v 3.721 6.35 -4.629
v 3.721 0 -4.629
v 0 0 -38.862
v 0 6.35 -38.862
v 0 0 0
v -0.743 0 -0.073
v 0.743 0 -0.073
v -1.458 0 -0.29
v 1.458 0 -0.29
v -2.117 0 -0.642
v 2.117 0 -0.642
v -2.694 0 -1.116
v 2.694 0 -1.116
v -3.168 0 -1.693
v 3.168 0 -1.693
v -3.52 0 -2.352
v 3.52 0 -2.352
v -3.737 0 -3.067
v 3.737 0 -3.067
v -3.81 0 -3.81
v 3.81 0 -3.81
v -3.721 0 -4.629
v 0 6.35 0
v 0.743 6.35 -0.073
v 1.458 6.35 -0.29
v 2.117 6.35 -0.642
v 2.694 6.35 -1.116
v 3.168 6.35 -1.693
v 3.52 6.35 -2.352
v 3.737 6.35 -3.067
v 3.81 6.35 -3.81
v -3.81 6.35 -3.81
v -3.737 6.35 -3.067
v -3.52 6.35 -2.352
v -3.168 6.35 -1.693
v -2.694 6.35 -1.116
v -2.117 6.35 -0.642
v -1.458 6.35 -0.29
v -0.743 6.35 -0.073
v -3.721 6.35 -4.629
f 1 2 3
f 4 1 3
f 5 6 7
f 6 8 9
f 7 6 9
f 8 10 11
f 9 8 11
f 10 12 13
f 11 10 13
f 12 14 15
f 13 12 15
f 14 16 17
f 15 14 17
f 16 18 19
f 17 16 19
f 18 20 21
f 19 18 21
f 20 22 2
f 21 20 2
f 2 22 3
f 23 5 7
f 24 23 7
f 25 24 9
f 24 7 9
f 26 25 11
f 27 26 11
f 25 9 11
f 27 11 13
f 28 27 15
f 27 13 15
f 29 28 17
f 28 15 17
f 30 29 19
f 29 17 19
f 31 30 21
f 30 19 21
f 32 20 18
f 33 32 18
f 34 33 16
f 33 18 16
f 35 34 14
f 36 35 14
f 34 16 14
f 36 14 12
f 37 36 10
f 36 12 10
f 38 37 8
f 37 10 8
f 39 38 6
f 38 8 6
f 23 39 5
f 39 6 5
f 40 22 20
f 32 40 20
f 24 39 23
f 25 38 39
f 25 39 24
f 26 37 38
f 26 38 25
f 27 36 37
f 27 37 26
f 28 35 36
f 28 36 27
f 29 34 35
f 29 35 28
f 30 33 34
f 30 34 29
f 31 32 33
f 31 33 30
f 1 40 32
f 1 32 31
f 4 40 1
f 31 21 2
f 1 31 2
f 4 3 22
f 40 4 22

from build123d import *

# Parameters (mm, degrees)
BOSS_EXTRUDE1_DEPTH = 6.35


with BuildPart() as part:
    # Sketch1 → Boss-Extrude1 (new body)
    with BuildSketch(Plane(origin=(0, 0, 0), x_dir=(1, 0, 0), z_dir=(0, 1, 0))):
        with BuildLine():
            ThreePointArc((-3.81, 3.81), (-2.694076836, 1.115923164), (0, 0))
            Line((0, 0), (0, 7.62))
            ThreePointArc((0, 7.62), (-2.387181834, 6.779421306), (-3.721022887, 4.628589444))
            Line((-3.721022887, 4.628589444), (-3.81, 3.81))
        make_face()
        with BuildLine():
            ThreePointArc((-3.721022887, 4.628589444), (-2.387181834, 6.779421306), (0, 7.62))
            Line((0, 7.62), (0, 38.862))
            Line((0, 38.862), (-3.721022887, 4.628589444))
        make_face()
        with BuildLine():
            Line((0, 7.62), (0, 0))
            ThreePointArc((0, 0), (2.694076836, 1.115923164), (3.81, 3.81))
            Line((3.81, 3.81), (3.721022887, 4.628589444))
            ThreePointArc((3.721022887, 4.628589444), (2.387181834, 6.779421306), (0, 7.62))
        make_face()
        with BuildLine():
            Line((0, 38.862), (0, 7.62))
            ThreePointArc((0, 7.62), (2.387181834, 6.779421306), (3.721022887, 4.628589444))
            Line((3.721022887, 4.628589444), (0, 38.862))
        make_face()
    extrude(amount=BOSS_EXTRUDE1_DEPTH)


solid = part.part
